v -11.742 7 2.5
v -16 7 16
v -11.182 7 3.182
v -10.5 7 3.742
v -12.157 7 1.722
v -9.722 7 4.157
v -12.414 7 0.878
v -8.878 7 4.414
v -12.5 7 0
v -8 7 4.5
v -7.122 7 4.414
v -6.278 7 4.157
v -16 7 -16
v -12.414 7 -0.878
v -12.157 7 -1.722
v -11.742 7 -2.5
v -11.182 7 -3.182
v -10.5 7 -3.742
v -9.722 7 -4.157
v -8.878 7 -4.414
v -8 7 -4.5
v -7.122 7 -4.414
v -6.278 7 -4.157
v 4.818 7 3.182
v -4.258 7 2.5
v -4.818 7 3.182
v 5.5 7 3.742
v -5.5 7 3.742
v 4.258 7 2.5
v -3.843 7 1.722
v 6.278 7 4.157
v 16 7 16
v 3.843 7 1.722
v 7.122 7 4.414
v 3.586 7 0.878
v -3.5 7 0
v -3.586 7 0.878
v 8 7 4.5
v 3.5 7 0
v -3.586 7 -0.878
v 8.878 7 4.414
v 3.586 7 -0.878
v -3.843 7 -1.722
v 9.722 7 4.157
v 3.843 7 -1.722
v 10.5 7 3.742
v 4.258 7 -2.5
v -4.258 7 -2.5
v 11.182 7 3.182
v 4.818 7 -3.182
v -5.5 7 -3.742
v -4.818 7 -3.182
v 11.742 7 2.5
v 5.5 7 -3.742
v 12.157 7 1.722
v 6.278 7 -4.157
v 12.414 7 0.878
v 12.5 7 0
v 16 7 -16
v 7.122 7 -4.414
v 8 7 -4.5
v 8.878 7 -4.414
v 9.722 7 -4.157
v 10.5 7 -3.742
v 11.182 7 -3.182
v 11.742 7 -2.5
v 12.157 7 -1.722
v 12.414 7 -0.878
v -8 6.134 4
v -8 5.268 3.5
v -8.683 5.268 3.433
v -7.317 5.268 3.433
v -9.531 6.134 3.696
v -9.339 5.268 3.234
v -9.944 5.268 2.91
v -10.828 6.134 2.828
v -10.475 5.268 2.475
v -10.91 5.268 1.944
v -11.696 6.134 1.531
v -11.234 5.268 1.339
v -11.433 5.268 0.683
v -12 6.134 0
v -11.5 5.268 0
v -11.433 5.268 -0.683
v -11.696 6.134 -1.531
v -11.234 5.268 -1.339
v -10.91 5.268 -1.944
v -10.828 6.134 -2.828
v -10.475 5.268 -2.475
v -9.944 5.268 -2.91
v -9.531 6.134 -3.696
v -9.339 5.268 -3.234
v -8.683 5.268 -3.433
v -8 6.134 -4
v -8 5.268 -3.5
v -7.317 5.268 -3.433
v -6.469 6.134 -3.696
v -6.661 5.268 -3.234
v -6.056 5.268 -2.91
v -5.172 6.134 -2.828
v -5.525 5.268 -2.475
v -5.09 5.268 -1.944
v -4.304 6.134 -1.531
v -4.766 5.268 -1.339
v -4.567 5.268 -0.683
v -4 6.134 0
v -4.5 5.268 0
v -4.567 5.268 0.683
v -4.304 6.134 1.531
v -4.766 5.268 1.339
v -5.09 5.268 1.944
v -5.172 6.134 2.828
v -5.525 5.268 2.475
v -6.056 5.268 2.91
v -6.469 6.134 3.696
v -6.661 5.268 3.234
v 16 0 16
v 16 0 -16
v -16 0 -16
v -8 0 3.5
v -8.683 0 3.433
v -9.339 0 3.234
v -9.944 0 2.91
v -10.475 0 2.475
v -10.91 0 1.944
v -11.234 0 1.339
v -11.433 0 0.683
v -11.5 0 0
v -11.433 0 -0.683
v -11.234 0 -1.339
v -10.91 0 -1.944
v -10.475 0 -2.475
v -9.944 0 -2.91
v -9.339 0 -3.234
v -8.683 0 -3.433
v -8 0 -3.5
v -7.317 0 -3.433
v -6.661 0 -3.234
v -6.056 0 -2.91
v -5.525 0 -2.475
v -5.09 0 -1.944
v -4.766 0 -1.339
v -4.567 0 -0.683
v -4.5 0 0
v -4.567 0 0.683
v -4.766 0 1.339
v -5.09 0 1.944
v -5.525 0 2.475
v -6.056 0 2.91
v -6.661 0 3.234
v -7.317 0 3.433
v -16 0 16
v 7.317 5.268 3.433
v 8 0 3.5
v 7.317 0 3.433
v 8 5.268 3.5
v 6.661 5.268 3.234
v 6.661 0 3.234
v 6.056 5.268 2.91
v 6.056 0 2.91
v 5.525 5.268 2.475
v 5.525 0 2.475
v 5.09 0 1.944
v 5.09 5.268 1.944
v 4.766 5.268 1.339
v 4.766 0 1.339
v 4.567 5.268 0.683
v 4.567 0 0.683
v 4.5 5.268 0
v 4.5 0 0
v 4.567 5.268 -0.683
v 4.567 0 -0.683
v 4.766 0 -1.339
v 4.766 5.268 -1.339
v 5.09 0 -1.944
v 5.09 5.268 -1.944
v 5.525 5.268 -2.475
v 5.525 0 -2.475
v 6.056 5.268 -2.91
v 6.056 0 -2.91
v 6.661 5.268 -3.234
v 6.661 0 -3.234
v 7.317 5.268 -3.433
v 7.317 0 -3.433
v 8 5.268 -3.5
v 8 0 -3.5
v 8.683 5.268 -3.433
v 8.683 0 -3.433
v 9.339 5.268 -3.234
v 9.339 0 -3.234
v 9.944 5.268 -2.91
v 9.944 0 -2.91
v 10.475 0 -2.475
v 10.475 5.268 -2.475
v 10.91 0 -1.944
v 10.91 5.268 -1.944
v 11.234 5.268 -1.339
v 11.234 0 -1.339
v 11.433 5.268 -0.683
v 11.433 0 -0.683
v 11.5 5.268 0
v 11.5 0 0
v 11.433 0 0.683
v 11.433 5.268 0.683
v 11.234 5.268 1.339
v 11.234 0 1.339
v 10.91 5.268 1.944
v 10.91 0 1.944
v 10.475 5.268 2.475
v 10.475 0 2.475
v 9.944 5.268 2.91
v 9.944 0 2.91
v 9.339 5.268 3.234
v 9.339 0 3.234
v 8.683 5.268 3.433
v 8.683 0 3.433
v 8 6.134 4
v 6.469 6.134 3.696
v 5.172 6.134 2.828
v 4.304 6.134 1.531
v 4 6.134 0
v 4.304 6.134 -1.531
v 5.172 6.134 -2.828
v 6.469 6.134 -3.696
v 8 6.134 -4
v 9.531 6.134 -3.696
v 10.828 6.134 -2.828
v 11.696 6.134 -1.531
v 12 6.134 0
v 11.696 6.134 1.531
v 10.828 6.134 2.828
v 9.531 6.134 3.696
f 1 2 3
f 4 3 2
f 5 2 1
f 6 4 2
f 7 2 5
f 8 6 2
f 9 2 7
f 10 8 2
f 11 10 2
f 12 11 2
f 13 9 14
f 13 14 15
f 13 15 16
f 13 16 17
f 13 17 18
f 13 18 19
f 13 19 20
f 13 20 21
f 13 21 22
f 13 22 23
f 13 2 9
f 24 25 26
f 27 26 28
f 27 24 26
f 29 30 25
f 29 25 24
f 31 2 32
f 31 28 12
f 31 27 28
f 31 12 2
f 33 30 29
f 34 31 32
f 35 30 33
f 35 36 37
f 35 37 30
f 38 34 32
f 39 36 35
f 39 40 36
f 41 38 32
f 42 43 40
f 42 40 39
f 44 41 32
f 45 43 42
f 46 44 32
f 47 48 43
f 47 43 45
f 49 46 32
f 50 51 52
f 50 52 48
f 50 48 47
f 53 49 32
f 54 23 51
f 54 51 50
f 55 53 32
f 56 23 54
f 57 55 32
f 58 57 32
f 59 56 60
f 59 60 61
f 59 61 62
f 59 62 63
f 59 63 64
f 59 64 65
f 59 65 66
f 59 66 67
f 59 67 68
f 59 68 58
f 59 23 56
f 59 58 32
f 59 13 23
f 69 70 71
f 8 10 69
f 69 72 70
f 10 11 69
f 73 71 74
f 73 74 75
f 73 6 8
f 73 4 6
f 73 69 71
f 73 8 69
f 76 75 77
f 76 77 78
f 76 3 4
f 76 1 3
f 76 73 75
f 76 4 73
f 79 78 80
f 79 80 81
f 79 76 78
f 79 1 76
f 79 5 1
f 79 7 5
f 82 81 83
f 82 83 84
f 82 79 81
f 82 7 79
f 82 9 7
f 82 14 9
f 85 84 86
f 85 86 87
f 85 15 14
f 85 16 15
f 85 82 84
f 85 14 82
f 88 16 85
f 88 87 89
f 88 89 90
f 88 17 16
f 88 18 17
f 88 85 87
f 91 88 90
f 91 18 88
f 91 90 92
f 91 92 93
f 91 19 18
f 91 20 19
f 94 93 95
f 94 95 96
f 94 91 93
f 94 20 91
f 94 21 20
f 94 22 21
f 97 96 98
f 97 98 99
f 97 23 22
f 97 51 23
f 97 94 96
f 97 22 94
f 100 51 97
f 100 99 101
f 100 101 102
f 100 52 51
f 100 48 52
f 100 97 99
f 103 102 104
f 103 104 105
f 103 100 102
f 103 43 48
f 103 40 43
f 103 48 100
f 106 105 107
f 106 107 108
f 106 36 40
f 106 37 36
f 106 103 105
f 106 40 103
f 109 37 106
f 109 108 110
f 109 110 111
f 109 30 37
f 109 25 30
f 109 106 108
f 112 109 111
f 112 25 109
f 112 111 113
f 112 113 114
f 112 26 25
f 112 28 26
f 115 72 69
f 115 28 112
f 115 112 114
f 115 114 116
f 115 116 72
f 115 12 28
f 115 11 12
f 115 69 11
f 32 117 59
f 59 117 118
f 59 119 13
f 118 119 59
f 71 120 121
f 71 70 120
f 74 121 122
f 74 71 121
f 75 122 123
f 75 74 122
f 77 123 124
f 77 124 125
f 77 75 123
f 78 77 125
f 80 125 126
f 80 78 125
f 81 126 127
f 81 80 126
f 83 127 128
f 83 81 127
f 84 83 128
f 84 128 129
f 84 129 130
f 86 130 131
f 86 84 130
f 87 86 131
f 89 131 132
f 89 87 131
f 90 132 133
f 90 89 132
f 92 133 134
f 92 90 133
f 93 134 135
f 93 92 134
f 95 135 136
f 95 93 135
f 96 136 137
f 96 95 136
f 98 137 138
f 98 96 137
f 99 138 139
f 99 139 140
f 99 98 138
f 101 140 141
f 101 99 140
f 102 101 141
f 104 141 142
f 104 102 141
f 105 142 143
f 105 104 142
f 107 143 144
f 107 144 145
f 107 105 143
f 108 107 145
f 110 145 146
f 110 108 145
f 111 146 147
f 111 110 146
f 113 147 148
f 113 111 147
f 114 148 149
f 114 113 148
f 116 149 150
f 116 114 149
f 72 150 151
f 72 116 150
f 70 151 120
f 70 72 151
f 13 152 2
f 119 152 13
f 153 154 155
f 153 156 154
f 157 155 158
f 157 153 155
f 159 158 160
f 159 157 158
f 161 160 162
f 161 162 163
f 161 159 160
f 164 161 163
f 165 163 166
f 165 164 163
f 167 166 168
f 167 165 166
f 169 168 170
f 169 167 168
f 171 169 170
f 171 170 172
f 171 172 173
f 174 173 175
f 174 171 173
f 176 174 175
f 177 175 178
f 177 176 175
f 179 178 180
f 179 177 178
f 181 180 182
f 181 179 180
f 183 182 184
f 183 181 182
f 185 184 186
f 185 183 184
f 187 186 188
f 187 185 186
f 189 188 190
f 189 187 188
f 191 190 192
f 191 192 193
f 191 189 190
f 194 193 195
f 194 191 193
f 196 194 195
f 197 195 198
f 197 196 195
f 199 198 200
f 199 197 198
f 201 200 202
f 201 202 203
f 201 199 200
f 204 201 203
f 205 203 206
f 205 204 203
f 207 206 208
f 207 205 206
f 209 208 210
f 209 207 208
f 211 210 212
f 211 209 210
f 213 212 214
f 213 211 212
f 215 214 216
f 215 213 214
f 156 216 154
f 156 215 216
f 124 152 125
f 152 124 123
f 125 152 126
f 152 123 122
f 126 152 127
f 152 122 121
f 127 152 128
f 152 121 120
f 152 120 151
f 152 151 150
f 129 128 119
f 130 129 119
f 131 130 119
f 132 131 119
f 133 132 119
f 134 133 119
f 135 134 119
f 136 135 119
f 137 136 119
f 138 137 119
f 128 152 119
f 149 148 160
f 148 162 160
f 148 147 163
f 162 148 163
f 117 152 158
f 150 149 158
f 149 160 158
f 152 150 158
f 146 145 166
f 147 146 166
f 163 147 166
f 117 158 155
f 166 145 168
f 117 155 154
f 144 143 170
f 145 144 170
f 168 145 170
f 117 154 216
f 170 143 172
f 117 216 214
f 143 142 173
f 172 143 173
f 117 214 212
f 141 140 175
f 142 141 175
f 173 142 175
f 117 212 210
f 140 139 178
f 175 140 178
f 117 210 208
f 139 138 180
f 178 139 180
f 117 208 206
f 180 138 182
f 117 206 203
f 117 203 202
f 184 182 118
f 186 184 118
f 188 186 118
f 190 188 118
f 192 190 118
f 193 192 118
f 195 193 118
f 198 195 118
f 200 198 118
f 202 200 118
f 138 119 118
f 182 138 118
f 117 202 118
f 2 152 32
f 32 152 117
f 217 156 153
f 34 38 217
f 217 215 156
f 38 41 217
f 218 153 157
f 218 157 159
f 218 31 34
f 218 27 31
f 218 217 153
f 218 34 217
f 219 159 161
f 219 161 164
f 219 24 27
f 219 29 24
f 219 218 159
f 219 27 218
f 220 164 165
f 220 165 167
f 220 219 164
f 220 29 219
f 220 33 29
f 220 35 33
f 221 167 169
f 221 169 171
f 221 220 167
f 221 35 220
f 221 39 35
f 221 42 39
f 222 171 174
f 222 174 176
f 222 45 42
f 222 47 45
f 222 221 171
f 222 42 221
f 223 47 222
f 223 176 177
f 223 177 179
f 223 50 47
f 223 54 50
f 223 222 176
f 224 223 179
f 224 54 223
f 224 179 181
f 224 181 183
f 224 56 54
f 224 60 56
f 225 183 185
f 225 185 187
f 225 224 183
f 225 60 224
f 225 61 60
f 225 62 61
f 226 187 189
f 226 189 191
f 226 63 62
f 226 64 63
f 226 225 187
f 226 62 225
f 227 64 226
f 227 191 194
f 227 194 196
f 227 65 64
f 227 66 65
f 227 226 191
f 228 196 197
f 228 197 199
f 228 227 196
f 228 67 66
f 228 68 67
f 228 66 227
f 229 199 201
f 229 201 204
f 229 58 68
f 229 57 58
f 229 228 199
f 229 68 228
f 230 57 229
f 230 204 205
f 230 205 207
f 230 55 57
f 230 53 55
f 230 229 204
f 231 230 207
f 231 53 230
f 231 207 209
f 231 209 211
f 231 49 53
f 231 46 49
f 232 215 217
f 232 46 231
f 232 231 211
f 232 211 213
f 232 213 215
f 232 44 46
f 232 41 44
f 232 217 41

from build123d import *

# Parameters (mm, degrees)
SKETCH1_W                                      = 32
SKETCH1_H                                      = 32
BOSS_EXTRUDE1_DEPTH                            = 7
CSK_FOR_M2_FLAT_HEAD_MACHINE_SCREW1_AT_2_COUNT = 2
CSK_FOR_M2_FLAT_HEAD_MACHINE_SCREW1_AT_2_PITCH = 16


with BuildPart() as part:
    # Sketch1 → Boss-Extrude1 (new body)
    with BuildSketch(Plane(origin=(0, 0, 0), x_dir=(1, 0, 0), z_dir=(0, 1, 0))):
        Rectangle(SKETCH1_W, SKETCH1_H)
    extrude(amount=BOSS_EXTRUDE1_DEPTH)

    # Sketch5 → CSK for M2 Flat Head Machine Screw1 (revolve, cut)
    with BuildSketch(Plane(origin=(-8, 7, 0), x_dir=(0, 0, 1), z_dir=(1, 0, 0))):
        Polygon((0, 0), (0, 7), (3.5, 7), (3.5, 1.732050808), (4.5, 0), align=None)
    csk_for_m2_flat_head_machine_screw1 = revolve(axis=Axis((-8, 13.35, 0), (0, -1, 0)), mode=Mode.SUBTRACT)

    # CSK for M2 Flat Head Machine Screw1 at 2: CSK for M2 Flat Head Machine Screw1 ×2
    with Locations(*[(i * CSK_FOR_M2_FLAT_HEAD_MACHINE_SCREW1_AT_2_PITCH, 0, 0) for i in range(1, CSK_FOR_M2_FLAT_HEAD_MACHINE_SCREW1_AT_2_COUNT)]):
        add(csk_for_m2_flat_head_machine_screw1, mode=Mode.SUBTRACT)


solid = part.part
